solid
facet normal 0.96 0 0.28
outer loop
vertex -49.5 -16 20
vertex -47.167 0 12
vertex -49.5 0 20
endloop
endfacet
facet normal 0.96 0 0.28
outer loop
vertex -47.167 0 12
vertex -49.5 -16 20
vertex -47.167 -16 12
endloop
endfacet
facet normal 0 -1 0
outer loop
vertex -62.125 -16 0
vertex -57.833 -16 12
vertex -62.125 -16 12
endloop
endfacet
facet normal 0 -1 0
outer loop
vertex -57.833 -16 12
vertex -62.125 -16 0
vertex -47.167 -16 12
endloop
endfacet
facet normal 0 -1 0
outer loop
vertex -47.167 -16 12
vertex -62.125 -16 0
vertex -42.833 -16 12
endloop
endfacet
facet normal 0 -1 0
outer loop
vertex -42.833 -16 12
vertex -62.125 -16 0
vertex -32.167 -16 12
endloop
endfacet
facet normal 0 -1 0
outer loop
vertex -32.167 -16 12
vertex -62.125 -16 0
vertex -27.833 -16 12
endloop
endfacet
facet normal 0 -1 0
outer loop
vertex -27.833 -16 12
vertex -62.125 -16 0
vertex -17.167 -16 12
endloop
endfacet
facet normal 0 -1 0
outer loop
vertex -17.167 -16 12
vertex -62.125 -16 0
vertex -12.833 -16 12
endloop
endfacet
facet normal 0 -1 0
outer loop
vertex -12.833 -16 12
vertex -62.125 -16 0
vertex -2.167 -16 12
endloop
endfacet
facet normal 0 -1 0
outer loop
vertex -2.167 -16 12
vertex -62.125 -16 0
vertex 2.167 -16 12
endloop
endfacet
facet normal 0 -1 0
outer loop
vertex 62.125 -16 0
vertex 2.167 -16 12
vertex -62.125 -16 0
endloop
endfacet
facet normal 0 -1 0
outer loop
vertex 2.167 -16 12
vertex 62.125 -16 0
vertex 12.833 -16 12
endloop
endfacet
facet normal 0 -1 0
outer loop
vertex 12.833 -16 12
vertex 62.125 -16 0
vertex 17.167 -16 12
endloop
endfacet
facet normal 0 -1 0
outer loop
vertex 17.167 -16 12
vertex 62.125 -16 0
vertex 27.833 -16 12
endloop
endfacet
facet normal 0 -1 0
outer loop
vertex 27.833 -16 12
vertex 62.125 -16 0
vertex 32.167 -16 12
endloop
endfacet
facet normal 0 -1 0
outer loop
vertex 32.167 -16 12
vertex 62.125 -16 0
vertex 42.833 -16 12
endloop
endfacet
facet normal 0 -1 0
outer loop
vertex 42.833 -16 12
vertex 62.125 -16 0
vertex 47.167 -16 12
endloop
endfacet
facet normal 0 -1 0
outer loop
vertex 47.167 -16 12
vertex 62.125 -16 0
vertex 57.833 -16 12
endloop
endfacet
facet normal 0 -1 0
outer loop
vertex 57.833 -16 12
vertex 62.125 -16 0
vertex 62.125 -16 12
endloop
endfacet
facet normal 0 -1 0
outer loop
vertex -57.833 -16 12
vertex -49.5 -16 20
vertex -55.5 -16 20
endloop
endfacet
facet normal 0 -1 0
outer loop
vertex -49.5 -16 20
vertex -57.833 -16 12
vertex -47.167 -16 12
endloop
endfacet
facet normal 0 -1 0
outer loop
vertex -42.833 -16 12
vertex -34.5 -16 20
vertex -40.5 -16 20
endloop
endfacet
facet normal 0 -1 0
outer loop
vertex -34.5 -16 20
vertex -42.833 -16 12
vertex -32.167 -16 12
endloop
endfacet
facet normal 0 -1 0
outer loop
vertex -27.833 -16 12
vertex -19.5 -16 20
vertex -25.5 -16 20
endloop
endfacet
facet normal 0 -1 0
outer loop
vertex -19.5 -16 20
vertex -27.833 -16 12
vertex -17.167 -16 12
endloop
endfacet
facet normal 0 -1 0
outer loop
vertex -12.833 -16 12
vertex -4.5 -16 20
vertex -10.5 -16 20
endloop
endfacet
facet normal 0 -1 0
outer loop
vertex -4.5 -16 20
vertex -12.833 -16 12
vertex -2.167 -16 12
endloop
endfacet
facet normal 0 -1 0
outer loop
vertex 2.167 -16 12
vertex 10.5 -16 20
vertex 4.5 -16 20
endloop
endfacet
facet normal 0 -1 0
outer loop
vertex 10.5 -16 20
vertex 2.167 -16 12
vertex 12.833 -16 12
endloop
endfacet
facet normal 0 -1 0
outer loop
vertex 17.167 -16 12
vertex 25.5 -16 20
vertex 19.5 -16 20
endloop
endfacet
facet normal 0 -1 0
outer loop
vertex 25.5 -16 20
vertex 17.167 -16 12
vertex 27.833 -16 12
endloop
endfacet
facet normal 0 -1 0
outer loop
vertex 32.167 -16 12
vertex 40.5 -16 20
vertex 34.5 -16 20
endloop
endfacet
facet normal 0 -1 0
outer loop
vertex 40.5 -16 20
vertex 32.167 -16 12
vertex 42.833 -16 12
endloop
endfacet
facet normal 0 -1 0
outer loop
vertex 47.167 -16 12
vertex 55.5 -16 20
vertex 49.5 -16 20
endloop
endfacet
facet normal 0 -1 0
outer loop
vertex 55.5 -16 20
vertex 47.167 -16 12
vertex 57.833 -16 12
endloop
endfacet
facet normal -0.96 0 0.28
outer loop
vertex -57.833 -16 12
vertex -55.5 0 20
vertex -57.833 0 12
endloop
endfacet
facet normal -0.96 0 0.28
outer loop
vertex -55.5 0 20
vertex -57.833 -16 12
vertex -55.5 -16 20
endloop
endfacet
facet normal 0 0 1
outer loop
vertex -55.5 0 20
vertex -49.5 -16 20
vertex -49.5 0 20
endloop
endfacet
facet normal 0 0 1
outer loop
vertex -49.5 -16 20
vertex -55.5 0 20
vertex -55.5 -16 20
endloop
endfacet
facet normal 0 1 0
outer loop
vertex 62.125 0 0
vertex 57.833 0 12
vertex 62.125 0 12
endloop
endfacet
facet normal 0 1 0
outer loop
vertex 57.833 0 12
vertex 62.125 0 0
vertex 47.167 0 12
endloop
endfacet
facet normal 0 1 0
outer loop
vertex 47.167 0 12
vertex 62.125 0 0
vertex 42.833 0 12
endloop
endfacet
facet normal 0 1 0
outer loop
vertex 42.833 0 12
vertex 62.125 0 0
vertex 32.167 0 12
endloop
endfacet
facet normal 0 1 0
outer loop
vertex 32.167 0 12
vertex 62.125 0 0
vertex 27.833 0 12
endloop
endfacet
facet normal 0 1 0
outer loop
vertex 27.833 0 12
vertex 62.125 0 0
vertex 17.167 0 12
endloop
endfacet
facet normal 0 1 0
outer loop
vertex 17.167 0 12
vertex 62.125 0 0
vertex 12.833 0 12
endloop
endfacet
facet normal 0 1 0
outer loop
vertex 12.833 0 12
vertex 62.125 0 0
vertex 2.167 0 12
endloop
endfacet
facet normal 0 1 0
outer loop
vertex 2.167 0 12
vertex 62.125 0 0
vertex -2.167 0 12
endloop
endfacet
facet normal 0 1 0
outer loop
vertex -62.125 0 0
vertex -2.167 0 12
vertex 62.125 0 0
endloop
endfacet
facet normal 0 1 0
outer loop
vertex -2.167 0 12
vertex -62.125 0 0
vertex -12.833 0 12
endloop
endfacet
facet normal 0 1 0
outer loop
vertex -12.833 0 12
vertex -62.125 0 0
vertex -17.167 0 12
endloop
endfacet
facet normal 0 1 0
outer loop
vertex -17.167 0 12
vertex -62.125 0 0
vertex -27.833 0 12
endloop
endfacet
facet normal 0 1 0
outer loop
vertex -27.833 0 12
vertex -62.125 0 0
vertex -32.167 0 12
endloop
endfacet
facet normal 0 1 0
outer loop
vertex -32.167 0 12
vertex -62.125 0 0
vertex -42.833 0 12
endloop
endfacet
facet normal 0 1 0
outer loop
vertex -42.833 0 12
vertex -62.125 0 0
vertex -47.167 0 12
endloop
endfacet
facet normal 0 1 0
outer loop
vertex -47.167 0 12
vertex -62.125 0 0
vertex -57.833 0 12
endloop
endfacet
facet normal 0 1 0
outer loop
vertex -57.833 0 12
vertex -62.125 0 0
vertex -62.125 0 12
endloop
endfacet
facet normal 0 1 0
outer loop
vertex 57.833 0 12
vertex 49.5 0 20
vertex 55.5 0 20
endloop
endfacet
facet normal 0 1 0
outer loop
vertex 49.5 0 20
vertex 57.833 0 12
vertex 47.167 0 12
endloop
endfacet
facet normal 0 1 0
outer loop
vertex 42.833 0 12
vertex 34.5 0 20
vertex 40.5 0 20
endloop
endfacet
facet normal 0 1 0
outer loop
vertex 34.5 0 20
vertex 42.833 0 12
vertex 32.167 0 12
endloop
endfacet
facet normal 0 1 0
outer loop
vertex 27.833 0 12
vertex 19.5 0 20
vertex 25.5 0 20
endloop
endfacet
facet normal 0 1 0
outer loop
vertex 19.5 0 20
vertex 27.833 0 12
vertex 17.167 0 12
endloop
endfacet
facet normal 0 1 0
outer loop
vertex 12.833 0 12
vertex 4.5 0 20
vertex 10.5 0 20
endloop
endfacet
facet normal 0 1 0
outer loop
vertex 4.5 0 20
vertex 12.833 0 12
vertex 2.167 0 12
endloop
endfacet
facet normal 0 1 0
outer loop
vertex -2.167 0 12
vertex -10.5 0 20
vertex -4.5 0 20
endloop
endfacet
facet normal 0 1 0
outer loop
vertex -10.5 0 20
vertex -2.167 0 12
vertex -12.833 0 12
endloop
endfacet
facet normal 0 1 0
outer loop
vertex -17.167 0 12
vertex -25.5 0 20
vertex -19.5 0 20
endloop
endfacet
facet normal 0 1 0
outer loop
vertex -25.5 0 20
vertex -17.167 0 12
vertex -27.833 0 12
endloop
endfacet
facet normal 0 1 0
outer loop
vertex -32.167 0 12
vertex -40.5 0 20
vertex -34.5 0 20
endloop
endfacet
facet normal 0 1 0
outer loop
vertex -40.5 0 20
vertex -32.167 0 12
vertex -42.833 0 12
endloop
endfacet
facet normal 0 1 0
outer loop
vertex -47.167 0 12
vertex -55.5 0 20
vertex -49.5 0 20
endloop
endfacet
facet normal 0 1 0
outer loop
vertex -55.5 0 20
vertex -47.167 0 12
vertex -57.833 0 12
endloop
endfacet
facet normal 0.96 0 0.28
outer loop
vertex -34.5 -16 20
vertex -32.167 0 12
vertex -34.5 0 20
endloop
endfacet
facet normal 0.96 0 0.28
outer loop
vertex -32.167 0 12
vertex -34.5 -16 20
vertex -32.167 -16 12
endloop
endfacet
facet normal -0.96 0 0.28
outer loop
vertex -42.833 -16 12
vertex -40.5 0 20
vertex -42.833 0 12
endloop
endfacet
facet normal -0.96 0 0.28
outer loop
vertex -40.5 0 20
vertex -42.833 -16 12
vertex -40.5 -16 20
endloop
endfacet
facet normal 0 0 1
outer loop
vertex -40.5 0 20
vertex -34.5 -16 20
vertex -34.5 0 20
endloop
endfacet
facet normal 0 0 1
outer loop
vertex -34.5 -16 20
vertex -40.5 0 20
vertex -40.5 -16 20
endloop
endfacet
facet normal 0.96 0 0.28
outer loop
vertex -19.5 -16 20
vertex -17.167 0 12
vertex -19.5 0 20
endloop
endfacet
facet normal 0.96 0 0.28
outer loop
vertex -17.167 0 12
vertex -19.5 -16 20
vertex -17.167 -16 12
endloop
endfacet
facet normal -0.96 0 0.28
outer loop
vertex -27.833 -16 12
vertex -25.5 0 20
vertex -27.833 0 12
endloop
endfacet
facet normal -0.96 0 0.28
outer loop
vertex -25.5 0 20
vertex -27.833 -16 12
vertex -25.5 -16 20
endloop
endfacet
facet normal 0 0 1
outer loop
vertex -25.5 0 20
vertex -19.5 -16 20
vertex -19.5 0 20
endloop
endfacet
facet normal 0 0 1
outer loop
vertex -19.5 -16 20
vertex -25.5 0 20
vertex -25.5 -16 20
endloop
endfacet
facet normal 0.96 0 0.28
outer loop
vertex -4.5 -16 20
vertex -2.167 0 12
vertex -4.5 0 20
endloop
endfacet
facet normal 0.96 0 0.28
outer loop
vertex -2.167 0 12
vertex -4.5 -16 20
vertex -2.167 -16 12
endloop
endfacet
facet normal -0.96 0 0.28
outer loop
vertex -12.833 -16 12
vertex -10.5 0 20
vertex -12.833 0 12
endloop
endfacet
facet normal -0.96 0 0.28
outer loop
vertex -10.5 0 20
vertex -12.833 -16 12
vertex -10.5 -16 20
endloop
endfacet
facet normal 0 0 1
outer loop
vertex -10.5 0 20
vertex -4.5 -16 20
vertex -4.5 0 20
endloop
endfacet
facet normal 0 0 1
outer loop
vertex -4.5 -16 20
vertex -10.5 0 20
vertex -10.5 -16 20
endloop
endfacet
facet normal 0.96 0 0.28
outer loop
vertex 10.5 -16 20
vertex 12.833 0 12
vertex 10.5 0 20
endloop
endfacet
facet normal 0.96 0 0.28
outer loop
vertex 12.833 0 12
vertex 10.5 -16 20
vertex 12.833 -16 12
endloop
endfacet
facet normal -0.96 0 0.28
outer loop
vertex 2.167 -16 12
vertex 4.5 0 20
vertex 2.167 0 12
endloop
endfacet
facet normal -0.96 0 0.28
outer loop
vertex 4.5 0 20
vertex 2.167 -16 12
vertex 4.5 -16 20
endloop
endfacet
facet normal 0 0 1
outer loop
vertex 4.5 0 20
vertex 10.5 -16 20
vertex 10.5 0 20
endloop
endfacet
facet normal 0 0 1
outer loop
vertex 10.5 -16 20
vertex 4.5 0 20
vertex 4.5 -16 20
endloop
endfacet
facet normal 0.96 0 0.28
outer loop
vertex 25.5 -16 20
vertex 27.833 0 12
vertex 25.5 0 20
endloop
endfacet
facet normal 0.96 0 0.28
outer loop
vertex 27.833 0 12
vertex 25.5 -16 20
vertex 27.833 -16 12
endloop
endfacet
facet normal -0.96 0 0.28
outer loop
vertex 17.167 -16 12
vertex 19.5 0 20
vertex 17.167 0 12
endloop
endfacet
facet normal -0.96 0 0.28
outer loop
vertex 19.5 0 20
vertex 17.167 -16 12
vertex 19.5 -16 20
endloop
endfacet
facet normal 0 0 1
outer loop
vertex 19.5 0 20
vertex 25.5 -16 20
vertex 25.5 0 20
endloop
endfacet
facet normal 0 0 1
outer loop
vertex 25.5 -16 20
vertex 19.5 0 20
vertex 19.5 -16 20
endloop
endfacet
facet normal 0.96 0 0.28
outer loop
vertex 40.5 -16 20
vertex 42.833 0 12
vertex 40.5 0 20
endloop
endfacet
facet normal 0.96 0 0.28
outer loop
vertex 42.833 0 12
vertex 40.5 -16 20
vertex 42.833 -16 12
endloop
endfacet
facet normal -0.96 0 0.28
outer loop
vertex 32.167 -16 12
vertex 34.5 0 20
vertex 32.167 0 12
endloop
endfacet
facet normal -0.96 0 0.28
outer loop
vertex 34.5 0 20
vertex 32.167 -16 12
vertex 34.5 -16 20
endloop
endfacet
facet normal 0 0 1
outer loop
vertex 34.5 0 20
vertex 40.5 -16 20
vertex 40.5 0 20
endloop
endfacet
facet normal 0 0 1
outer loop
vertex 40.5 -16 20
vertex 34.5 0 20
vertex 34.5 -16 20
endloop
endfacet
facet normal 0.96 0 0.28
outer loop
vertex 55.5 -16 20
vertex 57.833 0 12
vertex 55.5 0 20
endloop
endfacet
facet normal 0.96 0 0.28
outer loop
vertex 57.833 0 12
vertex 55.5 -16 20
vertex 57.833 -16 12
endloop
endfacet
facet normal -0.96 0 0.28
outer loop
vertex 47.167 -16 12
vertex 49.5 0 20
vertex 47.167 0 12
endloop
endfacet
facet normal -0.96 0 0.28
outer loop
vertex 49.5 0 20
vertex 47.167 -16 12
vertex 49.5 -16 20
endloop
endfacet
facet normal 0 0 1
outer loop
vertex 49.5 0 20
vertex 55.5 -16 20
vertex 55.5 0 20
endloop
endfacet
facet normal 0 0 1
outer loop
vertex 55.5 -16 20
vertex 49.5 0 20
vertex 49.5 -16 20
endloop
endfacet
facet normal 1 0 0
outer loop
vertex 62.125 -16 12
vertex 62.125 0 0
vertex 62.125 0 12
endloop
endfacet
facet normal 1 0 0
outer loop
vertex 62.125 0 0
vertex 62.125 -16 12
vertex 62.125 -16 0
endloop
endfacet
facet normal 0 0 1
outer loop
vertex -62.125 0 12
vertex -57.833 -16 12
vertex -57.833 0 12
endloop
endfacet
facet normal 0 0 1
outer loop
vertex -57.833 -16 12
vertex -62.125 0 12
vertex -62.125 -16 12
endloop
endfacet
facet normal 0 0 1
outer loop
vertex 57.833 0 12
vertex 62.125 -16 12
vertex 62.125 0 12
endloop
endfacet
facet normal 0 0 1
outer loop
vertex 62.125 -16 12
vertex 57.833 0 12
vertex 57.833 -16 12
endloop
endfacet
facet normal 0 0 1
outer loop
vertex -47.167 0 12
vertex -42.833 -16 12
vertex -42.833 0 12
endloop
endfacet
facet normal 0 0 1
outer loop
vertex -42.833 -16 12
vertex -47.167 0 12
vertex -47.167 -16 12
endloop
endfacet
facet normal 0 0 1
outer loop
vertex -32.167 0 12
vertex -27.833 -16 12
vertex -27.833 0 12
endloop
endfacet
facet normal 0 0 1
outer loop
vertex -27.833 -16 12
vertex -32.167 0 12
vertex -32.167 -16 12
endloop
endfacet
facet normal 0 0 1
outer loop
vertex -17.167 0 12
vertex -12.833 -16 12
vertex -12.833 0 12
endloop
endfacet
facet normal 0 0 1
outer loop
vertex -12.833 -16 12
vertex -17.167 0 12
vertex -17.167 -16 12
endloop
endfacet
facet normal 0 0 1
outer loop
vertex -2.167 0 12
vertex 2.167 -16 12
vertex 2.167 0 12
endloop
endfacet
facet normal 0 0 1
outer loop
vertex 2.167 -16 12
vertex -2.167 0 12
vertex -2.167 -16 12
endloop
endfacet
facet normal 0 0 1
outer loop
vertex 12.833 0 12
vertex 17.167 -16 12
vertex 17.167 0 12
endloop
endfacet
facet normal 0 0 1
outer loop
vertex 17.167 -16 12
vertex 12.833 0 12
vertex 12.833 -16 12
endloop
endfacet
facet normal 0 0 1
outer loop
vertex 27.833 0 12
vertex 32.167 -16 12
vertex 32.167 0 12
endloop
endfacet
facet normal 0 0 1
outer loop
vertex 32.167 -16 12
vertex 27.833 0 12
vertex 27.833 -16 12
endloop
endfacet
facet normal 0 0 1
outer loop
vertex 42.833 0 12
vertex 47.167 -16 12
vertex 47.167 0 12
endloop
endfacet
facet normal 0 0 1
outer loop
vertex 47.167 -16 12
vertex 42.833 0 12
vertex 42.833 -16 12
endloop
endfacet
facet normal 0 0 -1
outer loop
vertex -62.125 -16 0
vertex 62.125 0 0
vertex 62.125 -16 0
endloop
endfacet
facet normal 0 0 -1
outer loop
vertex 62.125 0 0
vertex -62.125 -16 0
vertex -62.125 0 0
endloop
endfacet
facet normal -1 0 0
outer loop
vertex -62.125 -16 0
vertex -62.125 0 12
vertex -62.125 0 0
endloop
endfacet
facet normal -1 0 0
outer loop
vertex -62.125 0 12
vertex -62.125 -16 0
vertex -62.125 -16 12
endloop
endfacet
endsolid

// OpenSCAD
$fn = 32;

// ----------------------------------------------------------------------
// Toothed rack, 8 teeth
// 15 mm pitch, 8 mm teeth
// ----------------------------------------------------------------------

// --- parameters (mm) ---
bar_w = 16;      // bar width (Y)
bar_h = 12;      // bar height (Z)
teeth = 8;       // number of teeth
pitch = 15;      // tooth pitch
tooth_h = 8;     // tooth height above the bar
root_w = 11.25;  // tooth width at the root
crest_w = 6;     // tooth width at the crest

// --- derived feature positions (mm) ---
span = (teeth - 1) * pitch;  // = 105   distance between the outer teeth
bar_l = span + root_w + 8;   // = 124.25   bar length: teeth plus 4 mm at each end
tooth_x = -span / 2;         // = -52.5   X of the first tooth
height = bar_h + tooth_h;    // = 20   overall height
feature_centers = [
  [tooth_x + 0 * pitch, -bar_w / 2],
  [tooth_x + 1 * pitch, -bar_w / 2],
  [tooth_x + 2 * pitch, -bar_w / 2],
  [tooth_x + 3 * pitch, -bar_w / 2],
  [tooth_x + 4 * pitch, -bar_w / 2],
  [tooth_x + 5 * pitch, -bar_w / 2],
  [tooth_x + 6 * pitch, -bar_w / 2],
  [tooth_x + 7 * pitch, -bar_w / 2]
];   // tooth centre line, drives the tooth loop

// bar with a rack of teeth, one extruded trapezoium per centre
module rack_tooth() {
  linear_extrude(height = bar_w)
    polygon(points = [
      [0, 0],
      [root_w, 0],
      [root_w / 2 + crest_w / 2, tooth_h + 1],
      [root_w / 2 - crest_w / 2, tooth_h + 1]
    ]);
}

union() {
  translate([-bar_l / 2, -bar_w, 0]) cube([bar_l, bar_w, bar_h]);
  for (centre = feature_centers)
    translate([centre[0] - root_w / 2, 0, bar_h - 1]) rotate([90, 0, 0]) rack_tooth();
}
